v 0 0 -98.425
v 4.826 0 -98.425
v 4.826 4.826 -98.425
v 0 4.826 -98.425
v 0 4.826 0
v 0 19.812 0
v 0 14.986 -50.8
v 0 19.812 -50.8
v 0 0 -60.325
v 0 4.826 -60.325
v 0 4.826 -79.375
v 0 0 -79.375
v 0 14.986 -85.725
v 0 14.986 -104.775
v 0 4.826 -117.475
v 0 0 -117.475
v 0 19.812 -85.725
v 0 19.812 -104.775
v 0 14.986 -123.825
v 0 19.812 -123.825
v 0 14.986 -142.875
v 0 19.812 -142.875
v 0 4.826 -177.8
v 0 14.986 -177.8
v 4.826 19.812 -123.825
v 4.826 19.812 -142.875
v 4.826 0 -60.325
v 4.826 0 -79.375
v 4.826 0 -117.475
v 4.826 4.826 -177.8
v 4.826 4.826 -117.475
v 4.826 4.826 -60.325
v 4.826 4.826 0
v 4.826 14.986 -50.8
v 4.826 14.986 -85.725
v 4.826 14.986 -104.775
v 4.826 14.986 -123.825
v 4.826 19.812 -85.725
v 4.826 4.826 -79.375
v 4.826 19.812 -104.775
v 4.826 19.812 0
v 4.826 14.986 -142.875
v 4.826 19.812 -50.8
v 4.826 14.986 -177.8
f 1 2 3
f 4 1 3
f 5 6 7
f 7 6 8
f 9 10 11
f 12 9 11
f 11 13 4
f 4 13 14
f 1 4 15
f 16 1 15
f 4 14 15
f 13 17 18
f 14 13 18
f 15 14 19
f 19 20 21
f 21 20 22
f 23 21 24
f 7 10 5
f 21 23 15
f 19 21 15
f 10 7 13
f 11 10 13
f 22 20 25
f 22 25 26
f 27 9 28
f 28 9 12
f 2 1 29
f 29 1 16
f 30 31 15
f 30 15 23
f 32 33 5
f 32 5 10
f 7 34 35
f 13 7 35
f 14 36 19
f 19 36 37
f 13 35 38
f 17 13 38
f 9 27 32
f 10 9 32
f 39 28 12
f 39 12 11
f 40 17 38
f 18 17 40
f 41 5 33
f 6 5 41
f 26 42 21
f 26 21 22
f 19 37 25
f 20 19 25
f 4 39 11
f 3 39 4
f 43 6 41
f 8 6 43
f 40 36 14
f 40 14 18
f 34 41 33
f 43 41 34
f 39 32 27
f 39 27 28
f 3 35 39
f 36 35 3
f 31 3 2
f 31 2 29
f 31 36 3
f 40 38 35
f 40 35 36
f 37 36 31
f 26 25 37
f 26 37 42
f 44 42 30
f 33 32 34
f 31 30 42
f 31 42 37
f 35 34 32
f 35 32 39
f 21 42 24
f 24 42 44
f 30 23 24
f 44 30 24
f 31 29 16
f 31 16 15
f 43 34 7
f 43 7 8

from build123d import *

# Parameters (mm, degrees)
SKETCH1_W          = 177.8
SKETCH1_H          = 19.812
BASE_DEPTH         = 4.826
SKETCH2_W          = 34.925
SKETCH2_H          = 4.826
SKETCH2_W_2        = 19.05
TOP_TABS_DEPTH     = 179.965487231
SKETCH3_W          = 60.325
SKETCH3_H          = 4.826
SKETCH3_W_2        = 19.05
CUT_EXTRUDE2_DEPTH = 179.965487231


with BuildPart() as part:
    # Sketch1 → Base (new body)
    with BuildSketch(Plane(origin=(0, 0, 0), x_dir=(0, 0, -1), z_dir=(1, 0, 0))):
        with Locations((88.9, 9.906)):
            Rectangle(SKETCH1_W, SKETCH1_H)
    extrude(amount=BASE_DEPTH)

    # Sketch2 → Top Tabs (cut, through all)
    with BuildSketch(Plane(origin=(4.826, 0, 0), x_dir=(0, 0, -1), z_dir=(1, 0, 0))):
        with Locations((68.2625, 17.399)):
            Rectangle(SKETCH2_W, SKETCH2_H)
        with Locations((114.3, 17.399)):
            Rectangle(SKETCH2_W_2, SKETCH2_H)
        with Locations((160.3375, 17.399)):
            Rectangle(SKETCH2_W, SKETCH2_H)
    extrude(amount=-TOP_TABS_DEPTH, mode=Mode.SUBTRACT)

    # Sketch3 → Cut-Extrude2 (cut, through all)
    with BuildSketch(Plane(origin=(4.826, 0, 0), x_dir=(0, 0, -1), z_dir=(1, 0, 0))):
        with Locations((30.1625, 2.413)):
            Rectangle(SKETCH3_W, SKETCH3_H)
        with Locations((147.6375, 2.413)):
            Rectangle(SKETCH3_W, SKETCH3_H)
        with Locations((88.9, 2.413)):
            Rectangle(SKETCH3_W_2, SKETCH3_H)
    extrude(amount=-CUT_EXTRUDE2_DEPTH, mode=Mode.SUBTRACT)


solid = part.part
